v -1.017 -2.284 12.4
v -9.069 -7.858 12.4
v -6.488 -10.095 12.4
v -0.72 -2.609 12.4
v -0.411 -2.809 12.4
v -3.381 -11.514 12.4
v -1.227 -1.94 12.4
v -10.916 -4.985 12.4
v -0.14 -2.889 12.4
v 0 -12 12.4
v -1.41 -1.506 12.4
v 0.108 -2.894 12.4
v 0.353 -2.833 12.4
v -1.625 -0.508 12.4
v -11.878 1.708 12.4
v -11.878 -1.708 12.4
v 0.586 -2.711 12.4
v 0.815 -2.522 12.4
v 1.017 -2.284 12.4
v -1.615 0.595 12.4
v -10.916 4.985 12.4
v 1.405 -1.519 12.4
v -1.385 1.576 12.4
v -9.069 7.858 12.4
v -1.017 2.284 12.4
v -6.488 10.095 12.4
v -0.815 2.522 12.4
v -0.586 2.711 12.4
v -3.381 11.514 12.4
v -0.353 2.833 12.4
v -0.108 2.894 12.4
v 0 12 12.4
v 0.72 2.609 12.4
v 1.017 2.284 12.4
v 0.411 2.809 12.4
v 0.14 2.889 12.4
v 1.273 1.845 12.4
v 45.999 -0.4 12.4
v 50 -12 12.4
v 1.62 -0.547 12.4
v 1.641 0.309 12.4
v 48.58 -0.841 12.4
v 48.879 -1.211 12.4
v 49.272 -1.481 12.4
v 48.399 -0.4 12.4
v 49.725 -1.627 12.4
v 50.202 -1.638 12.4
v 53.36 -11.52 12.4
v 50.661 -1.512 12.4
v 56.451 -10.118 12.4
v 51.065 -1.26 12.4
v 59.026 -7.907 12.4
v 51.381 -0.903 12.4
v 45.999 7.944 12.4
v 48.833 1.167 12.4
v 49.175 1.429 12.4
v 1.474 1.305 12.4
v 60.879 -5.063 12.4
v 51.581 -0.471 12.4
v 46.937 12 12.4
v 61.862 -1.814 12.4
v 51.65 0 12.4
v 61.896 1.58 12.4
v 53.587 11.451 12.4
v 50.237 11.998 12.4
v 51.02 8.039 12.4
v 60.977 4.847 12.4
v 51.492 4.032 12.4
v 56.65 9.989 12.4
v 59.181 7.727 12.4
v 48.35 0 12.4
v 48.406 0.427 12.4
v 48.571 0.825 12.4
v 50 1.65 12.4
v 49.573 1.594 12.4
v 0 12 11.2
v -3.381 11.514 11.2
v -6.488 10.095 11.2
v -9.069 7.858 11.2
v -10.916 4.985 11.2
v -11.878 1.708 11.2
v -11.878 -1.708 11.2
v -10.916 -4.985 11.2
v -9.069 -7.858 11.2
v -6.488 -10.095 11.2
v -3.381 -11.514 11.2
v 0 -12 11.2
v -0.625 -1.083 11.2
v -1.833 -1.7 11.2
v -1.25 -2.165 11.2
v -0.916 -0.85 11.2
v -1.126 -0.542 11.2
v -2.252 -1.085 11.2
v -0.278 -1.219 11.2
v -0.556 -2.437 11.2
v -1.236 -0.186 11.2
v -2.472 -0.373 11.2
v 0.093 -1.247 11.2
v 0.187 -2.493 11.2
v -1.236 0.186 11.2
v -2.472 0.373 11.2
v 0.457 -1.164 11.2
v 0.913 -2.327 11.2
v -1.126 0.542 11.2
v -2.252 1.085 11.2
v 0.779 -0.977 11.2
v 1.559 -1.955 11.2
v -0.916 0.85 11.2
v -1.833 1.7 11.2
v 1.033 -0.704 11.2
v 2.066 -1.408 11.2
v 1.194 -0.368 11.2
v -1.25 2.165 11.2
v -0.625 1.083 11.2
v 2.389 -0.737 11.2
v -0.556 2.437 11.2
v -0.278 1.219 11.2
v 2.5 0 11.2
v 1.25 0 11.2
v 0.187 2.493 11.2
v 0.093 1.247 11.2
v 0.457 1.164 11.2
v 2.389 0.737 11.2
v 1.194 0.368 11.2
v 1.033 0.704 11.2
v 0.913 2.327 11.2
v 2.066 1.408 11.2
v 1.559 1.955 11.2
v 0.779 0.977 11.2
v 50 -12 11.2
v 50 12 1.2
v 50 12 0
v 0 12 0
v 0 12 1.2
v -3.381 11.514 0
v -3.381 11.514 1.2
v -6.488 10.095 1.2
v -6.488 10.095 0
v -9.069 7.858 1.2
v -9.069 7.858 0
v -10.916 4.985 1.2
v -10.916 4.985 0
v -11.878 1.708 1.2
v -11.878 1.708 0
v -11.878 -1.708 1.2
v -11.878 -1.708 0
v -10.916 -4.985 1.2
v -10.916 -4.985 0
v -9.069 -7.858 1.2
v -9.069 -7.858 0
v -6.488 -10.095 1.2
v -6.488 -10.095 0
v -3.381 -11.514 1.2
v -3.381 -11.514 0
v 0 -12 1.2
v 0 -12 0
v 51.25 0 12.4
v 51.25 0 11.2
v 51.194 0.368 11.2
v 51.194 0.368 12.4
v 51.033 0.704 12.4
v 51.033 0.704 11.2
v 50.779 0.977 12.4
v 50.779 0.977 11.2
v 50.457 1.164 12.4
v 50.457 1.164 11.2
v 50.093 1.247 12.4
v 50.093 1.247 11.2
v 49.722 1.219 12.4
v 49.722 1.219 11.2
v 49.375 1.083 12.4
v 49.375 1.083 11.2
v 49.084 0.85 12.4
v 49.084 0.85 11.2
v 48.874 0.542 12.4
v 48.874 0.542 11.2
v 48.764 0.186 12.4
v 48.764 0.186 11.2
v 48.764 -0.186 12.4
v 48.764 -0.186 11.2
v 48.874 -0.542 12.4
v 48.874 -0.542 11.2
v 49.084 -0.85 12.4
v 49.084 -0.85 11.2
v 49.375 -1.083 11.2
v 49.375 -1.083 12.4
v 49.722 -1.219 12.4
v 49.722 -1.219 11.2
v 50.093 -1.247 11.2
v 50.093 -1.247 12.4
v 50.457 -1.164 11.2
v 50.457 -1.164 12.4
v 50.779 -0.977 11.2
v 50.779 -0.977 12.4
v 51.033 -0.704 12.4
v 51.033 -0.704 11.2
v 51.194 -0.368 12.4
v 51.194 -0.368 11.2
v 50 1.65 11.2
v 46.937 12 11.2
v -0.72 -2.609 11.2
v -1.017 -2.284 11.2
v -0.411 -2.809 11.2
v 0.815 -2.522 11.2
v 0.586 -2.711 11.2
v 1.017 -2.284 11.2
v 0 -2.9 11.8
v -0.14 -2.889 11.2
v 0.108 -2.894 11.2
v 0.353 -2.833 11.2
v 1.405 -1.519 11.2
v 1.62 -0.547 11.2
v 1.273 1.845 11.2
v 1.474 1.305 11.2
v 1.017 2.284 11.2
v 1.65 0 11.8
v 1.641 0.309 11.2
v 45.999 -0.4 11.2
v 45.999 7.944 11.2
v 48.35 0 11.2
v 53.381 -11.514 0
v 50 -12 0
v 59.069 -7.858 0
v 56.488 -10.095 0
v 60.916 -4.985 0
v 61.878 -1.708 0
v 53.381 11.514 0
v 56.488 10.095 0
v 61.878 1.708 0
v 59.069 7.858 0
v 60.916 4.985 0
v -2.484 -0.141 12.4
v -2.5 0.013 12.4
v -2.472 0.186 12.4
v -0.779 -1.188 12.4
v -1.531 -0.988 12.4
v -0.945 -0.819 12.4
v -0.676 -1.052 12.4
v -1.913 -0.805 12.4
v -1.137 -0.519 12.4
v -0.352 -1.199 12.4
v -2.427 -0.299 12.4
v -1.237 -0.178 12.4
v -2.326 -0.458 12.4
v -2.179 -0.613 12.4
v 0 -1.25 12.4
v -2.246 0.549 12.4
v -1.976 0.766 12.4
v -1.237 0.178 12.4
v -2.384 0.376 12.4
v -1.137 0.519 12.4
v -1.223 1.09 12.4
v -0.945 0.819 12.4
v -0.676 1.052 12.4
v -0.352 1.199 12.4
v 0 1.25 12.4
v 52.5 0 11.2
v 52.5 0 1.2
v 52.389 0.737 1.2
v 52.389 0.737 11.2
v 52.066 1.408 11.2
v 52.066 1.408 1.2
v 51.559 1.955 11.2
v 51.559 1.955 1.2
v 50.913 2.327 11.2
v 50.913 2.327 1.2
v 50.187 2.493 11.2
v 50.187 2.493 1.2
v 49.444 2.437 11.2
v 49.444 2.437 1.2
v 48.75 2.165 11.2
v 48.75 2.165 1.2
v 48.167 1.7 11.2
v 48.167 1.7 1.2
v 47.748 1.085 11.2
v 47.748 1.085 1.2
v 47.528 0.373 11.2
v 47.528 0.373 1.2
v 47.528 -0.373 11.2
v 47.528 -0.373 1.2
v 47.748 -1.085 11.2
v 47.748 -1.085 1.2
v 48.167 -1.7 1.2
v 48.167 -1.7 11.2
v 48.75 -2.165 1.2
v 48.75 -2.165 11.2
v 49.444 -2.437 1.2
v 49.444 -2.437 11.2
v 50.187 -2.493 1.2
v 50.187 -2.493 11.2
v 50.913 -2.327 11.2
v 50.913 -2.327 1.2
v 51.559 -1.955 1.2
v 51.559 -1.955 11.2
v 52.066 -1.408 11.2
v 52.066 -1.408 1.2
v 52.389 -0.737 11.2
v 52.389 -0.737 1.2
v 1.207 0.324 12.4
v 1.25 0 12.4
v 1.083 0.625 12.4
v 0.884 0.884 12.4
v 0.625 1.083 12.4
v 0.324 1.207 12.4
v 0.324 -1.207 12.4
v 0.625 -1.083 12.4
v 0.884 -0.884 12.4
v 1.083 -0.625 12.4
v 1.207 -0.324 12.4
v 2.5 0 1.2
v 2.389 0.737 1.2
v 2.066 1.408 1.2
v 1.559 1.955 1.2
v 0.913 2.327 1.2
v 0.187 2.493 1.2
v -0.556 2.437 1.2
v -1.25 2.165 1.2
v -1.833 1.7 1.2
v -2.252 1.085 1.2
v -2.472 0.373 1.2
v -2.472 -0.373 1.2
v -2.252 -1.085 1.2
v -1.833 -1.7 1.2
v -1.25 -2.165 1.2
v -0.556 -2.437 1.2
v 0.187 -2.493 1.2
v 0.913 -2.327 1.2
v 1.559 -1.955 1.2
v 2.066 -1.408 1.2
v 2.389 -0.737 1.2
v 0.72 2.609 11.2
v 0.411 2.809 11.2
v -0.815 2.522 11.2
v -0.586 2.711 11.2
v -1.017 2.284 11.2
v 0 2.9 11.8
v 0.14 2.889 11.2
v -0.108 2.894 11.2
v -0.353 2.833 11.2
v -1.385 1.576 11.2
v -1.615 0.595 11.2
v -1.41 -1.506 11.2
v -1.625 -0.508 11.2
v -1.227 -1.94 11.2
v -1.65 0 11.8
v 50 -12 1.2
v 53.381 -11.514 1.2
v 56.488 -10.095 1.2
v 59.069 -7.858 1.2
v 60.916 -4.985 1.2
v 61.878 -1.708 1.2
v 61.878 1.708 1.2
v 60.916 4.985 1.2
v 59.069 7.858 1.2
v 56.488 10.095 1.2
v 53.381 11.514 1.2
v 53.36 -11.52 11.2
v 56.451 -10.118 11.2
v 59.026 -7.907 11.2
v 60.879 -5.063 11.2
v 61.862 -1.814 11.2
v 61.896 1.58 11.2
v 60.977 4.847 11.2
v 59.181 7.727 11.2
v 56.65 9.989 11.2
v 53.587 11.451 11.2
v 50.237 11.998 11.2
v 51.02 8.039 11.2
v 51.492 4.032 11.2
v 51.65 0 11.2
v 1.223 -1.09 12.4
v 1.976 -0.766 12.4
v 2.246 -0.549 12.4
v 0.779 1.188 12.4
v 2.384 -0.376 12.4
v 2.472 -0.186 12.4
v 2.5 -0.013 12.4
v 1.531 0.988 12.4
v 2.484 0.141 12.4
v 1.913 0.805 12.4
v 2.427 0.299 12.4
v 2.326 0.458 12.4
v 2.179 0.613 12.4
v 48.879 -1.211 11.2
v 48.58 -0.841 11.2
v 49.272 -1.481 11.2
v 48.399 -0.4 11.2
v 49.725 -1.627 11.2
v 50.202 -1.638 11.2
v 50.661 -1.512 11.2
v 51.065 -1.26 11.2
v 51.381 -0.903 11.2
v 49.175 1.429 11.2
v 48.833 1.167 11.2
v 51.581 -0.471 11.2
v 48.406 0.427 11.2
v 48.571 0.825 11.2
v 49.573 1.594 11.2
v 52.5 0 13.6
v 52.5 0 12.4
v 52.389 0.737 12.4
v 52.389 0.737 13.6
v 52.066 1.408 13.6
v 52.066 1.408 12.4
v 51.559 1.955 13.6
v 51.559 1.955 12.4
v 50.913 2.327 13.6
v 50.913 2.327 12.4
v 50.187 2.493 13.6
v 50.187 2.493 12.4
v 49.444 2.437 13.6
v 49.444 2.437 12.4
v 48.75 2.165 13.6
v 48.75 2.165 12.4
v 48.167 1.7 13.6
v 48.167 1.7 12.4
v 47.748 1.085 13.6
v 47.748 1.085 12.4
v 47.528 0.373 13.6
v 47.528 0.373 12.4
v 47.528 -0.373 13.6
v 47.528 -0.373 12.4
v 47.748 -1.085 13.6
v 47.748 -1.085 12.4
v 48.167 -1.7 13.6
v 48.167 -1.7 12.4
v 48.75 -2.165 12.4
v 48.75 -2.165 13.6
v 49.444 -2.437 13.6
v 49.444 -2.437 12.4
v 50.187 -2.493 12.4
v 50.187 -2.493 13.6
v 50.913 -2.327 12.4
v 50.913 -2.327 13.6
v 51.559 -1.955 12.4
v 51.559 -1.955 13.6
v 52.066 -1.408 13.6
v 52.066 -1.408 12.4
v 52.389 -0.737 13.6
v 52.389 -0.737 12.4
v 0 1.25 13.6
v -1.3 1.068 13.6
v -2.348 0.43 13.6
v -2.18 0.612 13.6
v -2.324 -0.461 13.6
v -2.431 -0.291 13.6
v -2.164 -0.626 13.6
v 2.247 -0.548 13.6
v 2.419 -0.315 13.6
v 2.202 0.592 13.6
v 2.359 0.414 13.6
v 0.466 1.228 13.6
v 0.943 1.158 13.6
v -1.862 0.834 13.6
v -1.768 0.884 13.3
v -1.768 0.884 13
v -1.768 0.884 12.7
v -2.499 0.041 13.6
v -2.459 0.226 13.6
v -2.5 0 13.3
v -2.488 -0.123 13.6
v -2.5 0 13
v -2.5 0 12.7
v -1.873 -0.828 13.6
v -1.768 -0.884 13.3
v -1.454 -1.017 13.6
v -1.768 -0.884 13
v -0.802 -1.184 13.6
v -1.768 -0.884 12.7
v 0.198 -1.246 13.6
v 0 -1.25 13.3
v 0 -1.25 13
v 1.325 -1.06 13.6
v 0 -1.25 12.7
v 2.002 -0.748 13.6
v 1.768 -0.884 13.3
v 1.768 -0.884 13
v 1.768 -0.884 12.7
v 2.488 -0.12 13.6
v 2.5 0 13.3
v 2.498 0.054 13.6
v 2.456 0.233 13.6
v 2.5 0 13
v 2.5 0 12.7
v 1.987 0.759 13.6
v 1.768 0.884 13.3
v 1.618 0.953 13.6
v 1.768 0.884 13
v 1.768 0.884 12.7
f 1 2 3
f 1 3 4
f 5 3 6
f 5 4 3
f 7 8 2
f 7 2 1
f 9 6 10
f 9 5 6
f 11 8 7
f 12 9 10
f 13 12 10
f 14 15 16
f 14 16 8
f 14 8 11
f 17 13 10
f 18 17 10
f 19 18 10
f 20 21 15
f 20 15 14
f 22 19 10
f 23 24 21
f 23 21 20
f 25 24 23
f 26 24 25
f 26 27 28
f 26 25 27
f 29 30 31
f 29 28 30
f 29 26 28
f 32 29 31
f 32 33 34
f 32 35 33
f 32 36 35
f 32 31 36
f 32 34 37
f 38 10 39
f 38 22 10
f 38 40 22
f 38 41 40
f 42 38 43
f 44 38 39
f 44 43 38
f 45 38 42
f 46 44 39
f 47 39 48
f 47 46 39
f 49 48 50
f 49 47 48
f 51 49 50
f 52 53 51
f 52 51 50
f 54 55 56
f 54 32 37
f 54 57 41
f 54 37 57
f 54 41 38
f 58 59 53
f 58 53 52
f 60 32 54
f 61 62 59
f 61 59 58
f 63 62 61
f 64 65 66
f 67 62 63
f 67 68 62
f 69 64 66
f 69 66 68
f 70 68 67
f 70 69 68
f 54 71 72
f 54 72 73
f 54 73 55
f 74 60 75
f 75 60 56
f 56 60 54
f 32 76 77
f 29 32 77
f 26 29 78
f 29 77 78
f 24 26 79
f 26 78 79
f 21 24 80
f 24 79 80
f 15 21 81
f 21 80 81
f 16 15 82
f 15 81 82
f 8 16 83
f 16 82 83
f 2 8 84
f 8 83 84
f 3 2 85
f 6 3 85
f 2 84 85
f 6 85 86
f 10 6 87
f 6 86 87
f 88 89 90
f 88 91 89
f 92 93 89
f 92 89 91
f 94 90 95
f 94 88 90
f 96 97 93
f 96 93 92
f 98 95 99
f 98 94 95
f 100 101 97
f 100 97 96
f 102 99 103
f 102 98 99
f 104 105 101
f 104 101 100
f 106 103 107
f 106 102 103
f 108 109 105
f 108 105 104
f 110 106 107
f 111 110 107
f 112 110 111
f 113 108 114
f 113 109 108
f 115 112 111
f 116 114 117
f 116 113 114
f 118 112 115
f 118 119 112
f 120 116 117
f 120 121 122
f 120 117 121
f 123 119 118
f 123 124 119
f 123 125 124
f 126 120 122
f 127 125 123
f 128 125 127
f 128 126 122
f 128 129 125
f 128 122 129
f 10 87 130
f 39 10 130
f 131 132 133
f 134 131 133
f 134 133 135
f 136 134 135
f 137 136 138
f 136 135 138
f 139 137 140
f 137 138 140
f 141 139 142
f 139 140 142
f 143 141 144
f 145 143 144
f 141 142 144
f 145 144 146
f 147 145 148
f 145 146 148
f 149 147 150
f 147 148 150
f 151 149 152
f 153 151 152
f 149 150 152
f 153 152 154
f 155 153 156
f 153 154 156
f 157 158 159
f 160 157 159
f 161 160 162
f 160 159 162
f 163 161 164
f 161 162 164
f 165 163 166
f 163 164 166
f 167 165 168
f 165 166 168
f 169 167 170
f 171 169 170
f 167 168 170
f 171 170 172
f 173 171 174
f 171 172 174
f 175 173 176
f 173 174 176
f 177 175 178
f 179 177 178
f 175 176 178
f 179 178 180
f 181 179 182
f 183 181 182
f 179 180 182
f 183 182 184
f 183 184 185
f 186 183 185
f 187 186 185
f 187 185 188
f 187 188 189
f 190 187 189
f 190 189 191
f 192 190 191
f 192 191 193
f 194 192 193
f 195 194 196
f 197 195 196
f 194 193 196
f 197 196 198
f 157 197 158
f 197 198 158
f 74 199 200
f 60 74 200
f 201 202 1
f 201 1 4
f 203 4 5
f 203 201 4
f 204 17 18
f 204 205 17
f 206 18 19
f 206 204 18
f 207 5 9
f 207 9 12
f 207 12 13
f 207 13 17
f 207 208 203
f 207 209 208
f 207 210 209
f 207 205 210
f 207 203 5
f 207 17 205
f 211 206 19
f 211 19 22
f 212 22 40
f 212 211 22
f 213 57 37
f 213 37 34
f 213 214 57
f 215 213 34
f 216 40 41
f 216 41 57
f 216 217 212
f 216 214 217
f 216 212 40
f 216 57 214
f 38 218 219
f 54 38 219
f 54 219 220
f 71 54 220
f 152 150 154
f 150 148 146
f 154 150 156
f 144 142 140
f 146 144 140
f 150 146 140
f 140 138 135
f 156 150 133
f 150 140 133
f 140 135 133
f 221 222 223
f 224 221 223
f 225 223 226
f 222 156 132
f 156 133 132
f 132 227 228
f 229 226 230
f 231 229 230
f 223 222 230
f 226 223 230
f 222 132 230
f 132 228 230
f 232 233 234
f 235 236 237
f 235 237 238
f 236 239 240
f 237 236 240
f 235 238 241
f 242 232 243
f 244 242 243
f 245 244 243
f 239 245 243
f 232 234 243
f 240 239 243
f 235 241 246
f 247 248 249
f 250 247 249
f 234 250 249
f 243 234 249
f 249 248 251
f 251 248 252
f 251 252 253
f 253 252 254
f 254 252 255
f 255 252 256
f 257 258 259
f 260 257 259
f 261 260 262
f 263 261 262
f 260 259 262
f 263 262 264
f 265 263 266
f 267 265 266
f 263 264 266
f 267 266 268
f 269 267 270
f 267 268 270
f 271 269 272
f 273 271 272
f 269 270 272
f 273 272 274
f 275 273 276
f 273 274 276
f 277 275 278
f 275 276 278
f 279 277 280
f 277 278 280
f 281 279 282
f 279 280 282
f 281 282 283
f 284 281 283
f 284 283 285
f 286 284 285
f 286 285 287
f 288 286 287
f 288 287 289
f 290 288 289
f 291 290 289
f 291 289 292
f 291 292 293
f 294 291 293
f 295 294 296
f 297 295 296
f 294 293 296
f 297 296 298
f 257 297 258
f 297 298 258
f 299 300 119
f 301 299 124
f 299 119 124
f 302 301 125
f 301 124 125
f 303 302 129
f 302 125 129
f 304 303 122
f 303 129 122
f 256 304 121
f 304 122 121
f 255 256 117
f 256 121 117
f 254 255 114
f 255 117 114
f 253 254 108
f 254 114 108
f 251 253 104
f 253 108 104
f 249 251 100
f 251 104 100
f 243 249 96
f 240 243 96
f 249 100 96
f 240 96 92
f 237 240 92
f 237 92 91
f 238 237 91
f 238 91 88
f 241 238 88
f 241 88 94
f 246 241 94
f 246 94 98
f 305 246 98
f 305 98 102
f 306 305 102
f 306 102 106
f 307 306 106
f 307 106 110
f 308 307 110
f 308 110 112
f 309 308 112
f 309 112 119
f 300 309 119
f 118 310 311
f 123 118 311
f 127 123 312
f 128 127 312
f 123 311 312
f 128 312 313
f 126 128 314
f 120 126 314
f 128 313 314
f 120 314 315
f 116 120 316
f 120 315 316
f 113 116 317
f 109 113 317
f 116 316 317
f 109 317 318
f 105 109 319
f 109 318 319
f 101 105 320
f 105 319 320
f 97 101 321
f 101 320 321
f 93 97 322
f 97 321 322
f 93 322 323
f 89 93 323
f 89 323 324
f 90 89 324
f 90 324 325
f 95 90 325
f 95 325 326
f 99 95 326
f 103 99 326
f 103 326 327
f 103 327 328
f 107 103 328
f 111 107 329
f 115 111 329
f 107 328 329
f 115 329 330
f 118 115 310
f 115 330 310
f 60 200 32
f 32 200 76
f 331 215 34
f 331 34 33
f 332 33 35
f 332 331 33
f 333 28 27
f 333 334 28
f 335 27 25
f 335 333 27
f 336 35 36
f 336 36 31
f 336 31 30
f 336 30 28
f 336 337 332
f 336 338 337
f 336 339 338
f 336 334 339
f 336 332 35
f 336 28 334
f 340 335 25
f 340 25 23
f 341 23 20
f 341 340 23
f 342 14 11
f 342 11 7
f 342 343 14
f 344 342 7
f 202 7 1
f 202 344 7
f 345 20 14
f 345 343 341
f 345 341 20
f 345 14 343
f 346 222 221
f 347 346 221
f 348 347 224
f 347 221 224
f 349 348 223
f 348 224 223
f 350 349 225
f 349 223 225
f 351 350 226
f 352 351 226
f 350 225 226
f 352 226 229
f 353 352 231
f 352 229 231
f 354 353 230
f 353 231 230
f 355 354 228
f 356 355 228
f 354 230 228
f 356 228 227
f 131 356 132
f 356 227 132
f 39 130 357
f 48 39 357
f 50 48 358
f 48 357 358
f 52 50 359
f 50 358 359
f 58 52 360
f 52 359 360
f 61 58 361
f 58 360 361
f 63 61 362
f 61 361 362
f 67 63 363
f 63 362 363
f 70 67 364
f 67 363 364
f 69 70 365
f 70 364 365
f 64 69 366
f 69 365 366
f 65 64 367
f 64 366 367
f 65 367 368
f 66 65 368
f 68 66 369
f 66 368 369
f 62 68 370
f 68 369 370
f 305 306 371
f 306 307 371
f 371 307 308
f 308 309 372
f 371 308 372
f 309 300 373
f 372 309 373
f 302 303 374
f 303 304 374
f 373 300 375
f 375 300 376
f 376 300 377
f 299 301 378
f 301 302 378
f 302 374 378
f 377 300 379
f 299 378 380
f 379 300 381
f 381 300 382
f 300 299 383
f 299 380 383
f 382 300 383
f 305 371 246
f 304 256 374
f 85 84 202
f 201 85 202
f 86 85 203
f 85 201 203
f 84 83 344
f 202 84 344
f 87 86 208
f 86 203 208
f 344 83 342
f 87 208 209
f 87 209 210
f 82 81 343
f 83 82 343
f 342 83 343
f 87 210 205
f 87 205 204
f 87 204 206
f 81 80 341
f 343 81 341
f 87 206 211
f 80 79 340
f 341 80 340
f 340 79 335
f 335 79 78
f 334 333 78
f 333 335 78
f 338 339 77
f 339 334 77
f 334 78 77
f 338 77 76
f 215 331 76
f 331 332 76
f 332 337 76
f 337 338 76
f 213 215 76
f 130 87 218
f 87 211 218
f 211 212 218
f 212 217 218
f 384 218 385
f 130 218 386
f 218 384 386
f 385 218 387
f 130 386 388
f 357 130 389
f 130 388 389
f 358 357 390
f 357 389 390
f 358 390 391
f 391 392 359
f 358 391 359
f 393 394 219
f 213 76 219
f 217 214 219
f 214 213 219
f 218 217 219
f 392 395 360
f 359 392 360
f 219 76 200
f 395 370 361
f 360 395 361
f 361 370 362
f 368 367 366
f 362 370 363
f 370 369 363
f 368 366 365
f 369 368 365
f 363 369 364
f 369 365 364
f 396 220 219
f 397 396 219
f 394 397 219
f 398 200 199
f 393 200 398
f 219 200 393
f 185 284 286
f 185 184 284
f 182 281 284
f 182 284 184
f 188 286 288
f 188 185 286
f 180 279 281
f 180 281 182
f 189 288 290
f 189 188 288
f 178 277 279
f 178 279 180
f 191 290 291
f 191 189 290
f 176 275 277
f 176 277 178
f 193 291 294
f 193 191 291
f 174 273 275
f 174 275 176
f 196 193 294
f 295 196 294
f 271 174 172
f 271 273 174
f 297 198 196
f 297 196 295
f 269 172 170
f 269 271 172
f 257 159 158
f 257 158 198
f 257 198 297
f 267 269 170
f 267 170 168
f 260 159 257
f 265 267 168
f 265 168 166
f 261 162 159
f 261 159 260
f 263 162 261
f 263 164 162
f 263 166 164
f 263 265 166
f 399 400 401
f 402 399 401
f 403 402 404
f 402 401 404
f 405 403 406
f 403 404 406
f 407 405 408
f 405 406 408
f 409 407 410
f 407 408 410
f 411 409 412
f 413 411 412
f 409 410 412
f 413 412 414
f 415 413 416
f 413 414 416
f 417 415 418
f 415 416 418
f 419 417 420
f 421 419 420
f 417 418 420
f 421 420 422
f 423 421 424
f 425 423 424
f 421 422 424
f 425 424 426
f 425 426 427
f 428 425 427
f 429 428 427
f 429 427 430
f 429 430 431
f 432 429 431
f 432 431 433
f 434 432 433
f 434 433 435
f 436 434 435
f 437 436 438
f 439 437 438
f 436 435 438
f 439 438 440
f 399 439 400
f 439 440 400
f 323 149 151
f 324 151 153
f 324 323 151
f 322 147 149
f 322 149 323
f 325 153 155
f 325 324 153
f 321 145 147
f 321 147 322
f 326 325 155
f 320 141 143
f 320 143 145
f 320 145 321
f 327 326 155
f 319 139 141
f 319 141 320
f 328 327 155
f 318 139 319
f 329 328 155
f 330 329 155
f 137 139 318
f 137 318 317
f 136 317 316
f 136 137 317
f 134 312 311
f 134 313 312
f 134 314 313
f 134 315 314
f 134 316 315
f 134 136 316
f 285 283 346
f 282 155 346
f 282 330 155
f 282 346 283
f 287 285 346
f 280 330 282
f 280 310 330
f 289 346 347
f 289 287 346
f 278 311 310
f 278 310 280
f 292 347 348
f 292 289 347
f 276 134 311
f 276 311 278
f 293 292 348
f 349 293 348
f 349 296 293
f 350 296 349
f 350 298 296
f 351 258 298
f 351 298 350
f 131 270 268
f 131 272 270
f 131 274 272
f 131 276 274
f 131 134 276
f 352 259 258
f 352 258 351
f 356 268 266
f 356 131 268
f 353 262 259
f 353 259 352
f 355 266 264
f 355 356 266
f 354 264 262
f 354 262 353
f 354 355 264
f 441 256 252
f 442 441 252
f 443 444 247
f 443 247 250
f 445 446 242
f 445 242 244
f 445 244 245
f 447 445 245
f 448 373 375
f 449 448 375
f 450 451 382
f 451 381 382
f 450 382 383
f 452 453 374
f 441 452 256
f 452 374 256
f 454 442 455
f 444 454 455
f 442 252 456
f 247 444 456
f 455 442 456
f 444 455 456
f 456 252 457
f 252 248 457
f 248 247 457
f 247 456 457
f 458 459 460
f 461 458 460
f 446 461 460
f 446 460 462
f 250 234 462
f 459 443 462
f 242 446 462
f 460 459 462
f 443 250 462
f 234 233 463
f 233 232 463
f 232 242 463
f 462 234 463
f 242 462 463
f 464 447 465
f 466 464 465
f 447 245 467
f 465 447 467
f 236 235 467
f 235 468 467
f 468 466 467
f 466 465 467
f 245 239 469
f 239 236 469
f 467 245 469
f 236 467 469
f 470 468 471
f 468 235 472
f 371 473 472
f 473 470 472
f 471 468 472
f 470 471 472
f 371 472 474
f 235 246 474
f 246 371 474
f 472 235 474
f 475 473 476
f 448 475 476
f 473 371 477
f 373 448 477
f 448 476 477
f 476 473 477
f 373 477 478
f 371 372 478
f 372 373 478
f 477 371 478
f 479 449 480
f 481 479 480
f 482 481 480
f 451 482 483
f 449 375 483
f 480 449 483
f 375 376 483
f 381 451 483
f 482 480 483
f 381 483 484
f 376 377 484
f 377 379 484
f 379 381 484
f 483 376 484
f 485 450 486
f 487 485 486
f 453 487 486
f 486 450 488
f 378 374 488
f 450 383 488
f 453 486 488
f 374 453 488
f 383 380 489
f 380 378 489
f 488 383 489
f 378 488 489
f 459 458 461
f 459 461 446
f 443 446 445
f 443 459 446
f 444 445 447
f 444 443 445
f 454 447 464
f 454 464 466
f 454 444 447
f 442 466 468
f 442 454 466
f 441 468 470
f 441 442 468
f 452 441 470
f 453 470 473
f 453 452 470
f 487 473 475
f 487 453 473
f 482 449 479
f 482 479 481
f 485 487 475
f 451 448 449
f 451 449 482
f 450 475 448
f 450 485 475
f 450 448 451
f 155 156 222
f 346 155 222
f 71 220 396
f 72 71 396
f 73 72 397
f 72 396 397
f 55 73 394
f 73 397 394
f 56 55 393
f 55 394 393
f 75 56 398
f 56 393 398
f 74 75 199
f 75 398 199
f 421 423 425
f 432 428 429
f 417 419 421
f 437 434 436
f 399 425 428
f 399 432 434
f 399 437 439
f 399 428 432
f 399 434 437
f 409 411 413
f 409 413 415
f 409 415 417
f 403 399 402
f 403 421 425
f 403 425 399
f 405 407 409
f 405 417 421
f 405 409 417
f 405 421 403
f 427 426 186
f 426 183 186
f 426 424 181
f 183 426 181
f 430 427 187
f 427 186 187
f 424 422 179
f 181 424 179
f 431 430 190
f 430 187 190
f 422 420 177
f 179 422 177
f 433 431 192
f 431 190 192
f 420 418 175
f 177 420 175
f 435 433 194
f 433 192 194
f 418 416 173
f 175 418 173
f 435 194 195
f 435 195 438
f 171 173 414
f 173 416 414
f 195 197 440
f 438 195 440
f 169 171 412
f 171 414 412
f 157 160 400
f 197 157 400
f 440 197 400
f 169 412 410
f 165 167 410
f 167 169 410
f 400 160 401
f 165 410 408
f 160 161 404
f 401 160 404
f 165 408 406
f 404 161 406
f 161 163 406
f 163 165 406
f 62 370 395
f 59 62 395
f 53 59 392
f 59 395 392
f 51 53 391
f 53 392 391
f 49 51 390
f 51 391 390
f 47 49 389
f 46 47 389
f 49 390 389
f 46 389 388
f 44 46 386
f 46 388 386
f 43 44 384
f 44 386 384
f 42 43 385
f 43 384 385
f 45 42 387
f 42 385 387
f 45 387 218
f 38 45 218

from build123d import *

# Parameters (mm, degrees)
F1_DEPTH  = 1.2
F2_R      = 2.5
F3_DEPTH  = 10
F4_R      = 1.25
F5_R      = 1.25
F6_DEPTH  = 1.2
F8_R      = 2.5
F8_R_2    = 1.25
F9_DEPTH  = 1.2
F11_DEPTH = 1.2


with BuildPart() as f1:
    # F0 (on Top) → F1 (new body)
    with BuildSketch(Plane.XY):
        with BuildLine():
            ThreePointArc((0, 12), (-12, 0), (0, -12))
            Line((0, -12), (50, -12))
            ThreePointArc((50, -12), (62, 0), (50, 12))
            Line((50, 12), (0, 12))
        make_face()
    extrude(amount=F1_DEPTH)

    # F2 (on face) → F3 (join)
    with BuildSketch(Plane.XY.offset(1.2)):
        Circle(F2_R)
        with Locations((50, 0)):
            Circle(F2_R)
    extrude(amount=F3_DEPTH)

    # F4 (on face) + F5 (on face) → F6 (join)
    with BuildSketch(Plane.XY.offset(11.2)):
        Circle(F4_R)
    with BuildSketch(Plane.XY.offset(11.2)):
        with Locations((50, 0)):
            Circle(F5_R)
    extrude(amount=F6_DEPTH)

    # F7 (on face) + F8 (on face) → F9 (join)
    with BuildSketch(Plane.XY.offset(12.4)):
        with BuildLine():
            add(Edge.make_bspline(
                [(4.2e-09, -1.25), (2.5000000021, -1.2499999979), (2.5, 1e-09), (2.4999999979, 1.25), (0, 1.25)],
                knots=[1.5707963285, 1.5707963285, 1.5707963285, 3.1415926544, 3.1415926544, 4.7123889804, 4.7123889804, 4.7123889804], degree=2, weights=[1, 0.7071067815, 1, 0.7071067815, 1]))
            ThreePointArc((0, 1.25), (0.8838834765, 0.8838834765), (1.25, 0))
            ThreePointArc((1.25, 0), (0.883883478, -0.883883475), (4.2e-09, -1.25))
        make_face()
        with BuildLine():
            ThreePointArc((1.25, 0), (0.8838834765, 0.8838834765), (0, 1.25))
            ThreePointArc((0, 1.25), (-1.25, -2.1e-09), (4.2e-09, -1.25))
            ThreePointArc((4.2e-09, -1.25), (0.883883478, -0.883883475), (1.25, 0))
        make_face()
        with BuildLine():
            ThreePointArc((4.2e-09, -1.25), (-1.25, -2.1e-09), (0, 1.25))
            add(Edge.make_bspline(
                [(0, 1.25), (-2.5000000021, 1.25), (-2.5, -1e-09), (-2.4999999979, -1.2500000021), (4.2e-09, -1.25)],
                knots=[4.7123889804, 4.7123889804, 4.7123889804, 6.283185308, 6.283185308, 7.8539816357, 7.8539816357, 7.8539816357], degree=2, weights=[1, 0.7071067809, 1, 0.7071067809, 1]))
        make_face()
    with BuildSketch(Plane.XY.offset(12.4)):
        with Locations((50, 0)):
            Circle(F8_R)
        with Locations((50, 0)):
            Circle(F8_R_2, mode=Mode.SUBTRACT)
        with Locations((50, 0)):
            Circle(F8_R_2)
    extrude(amount=F9_DEPTH)


with BuildPart() as f11:
    # F10 (on face) → F11 (new body)
    with BuildSketch(Plane.XY.offset(11.2)):
        with BuildLine():
            ThreePointArc((0, 12), (-12, 0), (0, -12))
            Line((0, -12), (50, -12))
            ThreePointArc((50, -12), (61.9994137232, -0.1186182953), (50.237225, 11.99765495))
            ThreePointArc((50.237225, 11.99765495), (51.2955903136, 6.0402743626), (51.65, 0))
            ThreePointArc((51.65, 0), (50.2015083771, -1.6376490387), (48.3992189406, -0.4))
            Line((48.3992189406, -0.4), (45.9992189406, -0.4))
            Line((45.9992189406, -0.4), (45.9992189406, 7.9439693035))
            Line((45.9992189406, 7.9439693035), (48.35, 0))
            ThreePointArc((48.35, 0), (48.833273811, 1.166726189), (50, 1.65))
            Line((50, 1.65), (46.9372258332, 12))
            Line((46.9372258332, 12), (0, 12))
        make_face()
        with BuildLine():
            add(Edge.make_bspline(
                [(1.0168341302, 2.2838669733), (0, 3.6823510732), (-1.0168341302, 2.2838669733)],
                knots=[5.6191964791, 5.6191964791, 5.6191964791, 6.9471741352, 6.9471741352, 6.9471741352], degree=2, weights=[1, 0.7875403356, 1]))
            ThreePointArc((1.0168341302, 2.2838669733), (2.0966741909, 1.3616010198), (2.5, 0))
            ThreePointArc((2.5, 0), (2.0966741909, -1.3616010198), (1.0168341302, -2.2838669733))
            add(Edge.make_bspline(
                [(-1.0168341302, -2.2838669733), (0, -3.6823510732), (1.0168341302, -2.2838669733)],
                knots=[2.4776038255, 2.4776038255, 2.4776038255, 3.8055814816, 3.8055814816, 3.8055814816], degree=2, weights=[1, 0.7875403356, 1]))
            ThreePointArc((-1.0168341302, -2.2838669733), (-2.5, 0), (-1.0168341302, 2.2838669733))
        make_face(mode=Mode.SUBTRACT)
        with BuildLine():
            add(Edge.make_bspline(
                [(1.65, 0), (1.65, 1.4130539516), (1.0168341302, 2.2838669733)],
                knots=[4.7123889804, 4.7123889804, 4.7123889804, 5.6191964791, 5.6191964791, 5.6191964791], degree=2, weights=[1, 0.8989613755, 1]))
            add(Edge.make_bspline(
                [(1.0168341302, -2.2838669733), (1.65, -1.4130539516), (1.65, 0)],
                knots=[3.8055814816, 3.8055814816, 3.8055814816, 4.7123889804, 4.7123889804, 4.7123889804], degree=2, weights=[1, 0.8989613755, 1]))
            ThreePointArc((1.0168341302, -2.2838669733), (2.0966741909, -1.3616010198), (2.5, 0))
            ThreePointArc((2.5, 0), (2.0966741909, 1.3616010198), (1.0168341302, 2.2838669733))
        make_face()
        with BuildLine():
            add(Edge.make_bspline(
                [(-1.0168341302, 2.2838669733), (-2.6774278313, 0), (-1.0168341302, -2.2838669733)],
                knots=[0.663988828, 0.663988828, 0.663988828, 2.4776038255, 2.4776038255, 2.4776038255], degree=2, weights=[1, 0.6162631092, 1]))
            ThreePointArc((-1.0168341302, 2.2838669733), (-2.5, 0), (-1.0168341302, -2.2838669733))
        make_face()
    extrude(amount=F11_DEPTH)


solid = Compound([f1.part, f11.part])
